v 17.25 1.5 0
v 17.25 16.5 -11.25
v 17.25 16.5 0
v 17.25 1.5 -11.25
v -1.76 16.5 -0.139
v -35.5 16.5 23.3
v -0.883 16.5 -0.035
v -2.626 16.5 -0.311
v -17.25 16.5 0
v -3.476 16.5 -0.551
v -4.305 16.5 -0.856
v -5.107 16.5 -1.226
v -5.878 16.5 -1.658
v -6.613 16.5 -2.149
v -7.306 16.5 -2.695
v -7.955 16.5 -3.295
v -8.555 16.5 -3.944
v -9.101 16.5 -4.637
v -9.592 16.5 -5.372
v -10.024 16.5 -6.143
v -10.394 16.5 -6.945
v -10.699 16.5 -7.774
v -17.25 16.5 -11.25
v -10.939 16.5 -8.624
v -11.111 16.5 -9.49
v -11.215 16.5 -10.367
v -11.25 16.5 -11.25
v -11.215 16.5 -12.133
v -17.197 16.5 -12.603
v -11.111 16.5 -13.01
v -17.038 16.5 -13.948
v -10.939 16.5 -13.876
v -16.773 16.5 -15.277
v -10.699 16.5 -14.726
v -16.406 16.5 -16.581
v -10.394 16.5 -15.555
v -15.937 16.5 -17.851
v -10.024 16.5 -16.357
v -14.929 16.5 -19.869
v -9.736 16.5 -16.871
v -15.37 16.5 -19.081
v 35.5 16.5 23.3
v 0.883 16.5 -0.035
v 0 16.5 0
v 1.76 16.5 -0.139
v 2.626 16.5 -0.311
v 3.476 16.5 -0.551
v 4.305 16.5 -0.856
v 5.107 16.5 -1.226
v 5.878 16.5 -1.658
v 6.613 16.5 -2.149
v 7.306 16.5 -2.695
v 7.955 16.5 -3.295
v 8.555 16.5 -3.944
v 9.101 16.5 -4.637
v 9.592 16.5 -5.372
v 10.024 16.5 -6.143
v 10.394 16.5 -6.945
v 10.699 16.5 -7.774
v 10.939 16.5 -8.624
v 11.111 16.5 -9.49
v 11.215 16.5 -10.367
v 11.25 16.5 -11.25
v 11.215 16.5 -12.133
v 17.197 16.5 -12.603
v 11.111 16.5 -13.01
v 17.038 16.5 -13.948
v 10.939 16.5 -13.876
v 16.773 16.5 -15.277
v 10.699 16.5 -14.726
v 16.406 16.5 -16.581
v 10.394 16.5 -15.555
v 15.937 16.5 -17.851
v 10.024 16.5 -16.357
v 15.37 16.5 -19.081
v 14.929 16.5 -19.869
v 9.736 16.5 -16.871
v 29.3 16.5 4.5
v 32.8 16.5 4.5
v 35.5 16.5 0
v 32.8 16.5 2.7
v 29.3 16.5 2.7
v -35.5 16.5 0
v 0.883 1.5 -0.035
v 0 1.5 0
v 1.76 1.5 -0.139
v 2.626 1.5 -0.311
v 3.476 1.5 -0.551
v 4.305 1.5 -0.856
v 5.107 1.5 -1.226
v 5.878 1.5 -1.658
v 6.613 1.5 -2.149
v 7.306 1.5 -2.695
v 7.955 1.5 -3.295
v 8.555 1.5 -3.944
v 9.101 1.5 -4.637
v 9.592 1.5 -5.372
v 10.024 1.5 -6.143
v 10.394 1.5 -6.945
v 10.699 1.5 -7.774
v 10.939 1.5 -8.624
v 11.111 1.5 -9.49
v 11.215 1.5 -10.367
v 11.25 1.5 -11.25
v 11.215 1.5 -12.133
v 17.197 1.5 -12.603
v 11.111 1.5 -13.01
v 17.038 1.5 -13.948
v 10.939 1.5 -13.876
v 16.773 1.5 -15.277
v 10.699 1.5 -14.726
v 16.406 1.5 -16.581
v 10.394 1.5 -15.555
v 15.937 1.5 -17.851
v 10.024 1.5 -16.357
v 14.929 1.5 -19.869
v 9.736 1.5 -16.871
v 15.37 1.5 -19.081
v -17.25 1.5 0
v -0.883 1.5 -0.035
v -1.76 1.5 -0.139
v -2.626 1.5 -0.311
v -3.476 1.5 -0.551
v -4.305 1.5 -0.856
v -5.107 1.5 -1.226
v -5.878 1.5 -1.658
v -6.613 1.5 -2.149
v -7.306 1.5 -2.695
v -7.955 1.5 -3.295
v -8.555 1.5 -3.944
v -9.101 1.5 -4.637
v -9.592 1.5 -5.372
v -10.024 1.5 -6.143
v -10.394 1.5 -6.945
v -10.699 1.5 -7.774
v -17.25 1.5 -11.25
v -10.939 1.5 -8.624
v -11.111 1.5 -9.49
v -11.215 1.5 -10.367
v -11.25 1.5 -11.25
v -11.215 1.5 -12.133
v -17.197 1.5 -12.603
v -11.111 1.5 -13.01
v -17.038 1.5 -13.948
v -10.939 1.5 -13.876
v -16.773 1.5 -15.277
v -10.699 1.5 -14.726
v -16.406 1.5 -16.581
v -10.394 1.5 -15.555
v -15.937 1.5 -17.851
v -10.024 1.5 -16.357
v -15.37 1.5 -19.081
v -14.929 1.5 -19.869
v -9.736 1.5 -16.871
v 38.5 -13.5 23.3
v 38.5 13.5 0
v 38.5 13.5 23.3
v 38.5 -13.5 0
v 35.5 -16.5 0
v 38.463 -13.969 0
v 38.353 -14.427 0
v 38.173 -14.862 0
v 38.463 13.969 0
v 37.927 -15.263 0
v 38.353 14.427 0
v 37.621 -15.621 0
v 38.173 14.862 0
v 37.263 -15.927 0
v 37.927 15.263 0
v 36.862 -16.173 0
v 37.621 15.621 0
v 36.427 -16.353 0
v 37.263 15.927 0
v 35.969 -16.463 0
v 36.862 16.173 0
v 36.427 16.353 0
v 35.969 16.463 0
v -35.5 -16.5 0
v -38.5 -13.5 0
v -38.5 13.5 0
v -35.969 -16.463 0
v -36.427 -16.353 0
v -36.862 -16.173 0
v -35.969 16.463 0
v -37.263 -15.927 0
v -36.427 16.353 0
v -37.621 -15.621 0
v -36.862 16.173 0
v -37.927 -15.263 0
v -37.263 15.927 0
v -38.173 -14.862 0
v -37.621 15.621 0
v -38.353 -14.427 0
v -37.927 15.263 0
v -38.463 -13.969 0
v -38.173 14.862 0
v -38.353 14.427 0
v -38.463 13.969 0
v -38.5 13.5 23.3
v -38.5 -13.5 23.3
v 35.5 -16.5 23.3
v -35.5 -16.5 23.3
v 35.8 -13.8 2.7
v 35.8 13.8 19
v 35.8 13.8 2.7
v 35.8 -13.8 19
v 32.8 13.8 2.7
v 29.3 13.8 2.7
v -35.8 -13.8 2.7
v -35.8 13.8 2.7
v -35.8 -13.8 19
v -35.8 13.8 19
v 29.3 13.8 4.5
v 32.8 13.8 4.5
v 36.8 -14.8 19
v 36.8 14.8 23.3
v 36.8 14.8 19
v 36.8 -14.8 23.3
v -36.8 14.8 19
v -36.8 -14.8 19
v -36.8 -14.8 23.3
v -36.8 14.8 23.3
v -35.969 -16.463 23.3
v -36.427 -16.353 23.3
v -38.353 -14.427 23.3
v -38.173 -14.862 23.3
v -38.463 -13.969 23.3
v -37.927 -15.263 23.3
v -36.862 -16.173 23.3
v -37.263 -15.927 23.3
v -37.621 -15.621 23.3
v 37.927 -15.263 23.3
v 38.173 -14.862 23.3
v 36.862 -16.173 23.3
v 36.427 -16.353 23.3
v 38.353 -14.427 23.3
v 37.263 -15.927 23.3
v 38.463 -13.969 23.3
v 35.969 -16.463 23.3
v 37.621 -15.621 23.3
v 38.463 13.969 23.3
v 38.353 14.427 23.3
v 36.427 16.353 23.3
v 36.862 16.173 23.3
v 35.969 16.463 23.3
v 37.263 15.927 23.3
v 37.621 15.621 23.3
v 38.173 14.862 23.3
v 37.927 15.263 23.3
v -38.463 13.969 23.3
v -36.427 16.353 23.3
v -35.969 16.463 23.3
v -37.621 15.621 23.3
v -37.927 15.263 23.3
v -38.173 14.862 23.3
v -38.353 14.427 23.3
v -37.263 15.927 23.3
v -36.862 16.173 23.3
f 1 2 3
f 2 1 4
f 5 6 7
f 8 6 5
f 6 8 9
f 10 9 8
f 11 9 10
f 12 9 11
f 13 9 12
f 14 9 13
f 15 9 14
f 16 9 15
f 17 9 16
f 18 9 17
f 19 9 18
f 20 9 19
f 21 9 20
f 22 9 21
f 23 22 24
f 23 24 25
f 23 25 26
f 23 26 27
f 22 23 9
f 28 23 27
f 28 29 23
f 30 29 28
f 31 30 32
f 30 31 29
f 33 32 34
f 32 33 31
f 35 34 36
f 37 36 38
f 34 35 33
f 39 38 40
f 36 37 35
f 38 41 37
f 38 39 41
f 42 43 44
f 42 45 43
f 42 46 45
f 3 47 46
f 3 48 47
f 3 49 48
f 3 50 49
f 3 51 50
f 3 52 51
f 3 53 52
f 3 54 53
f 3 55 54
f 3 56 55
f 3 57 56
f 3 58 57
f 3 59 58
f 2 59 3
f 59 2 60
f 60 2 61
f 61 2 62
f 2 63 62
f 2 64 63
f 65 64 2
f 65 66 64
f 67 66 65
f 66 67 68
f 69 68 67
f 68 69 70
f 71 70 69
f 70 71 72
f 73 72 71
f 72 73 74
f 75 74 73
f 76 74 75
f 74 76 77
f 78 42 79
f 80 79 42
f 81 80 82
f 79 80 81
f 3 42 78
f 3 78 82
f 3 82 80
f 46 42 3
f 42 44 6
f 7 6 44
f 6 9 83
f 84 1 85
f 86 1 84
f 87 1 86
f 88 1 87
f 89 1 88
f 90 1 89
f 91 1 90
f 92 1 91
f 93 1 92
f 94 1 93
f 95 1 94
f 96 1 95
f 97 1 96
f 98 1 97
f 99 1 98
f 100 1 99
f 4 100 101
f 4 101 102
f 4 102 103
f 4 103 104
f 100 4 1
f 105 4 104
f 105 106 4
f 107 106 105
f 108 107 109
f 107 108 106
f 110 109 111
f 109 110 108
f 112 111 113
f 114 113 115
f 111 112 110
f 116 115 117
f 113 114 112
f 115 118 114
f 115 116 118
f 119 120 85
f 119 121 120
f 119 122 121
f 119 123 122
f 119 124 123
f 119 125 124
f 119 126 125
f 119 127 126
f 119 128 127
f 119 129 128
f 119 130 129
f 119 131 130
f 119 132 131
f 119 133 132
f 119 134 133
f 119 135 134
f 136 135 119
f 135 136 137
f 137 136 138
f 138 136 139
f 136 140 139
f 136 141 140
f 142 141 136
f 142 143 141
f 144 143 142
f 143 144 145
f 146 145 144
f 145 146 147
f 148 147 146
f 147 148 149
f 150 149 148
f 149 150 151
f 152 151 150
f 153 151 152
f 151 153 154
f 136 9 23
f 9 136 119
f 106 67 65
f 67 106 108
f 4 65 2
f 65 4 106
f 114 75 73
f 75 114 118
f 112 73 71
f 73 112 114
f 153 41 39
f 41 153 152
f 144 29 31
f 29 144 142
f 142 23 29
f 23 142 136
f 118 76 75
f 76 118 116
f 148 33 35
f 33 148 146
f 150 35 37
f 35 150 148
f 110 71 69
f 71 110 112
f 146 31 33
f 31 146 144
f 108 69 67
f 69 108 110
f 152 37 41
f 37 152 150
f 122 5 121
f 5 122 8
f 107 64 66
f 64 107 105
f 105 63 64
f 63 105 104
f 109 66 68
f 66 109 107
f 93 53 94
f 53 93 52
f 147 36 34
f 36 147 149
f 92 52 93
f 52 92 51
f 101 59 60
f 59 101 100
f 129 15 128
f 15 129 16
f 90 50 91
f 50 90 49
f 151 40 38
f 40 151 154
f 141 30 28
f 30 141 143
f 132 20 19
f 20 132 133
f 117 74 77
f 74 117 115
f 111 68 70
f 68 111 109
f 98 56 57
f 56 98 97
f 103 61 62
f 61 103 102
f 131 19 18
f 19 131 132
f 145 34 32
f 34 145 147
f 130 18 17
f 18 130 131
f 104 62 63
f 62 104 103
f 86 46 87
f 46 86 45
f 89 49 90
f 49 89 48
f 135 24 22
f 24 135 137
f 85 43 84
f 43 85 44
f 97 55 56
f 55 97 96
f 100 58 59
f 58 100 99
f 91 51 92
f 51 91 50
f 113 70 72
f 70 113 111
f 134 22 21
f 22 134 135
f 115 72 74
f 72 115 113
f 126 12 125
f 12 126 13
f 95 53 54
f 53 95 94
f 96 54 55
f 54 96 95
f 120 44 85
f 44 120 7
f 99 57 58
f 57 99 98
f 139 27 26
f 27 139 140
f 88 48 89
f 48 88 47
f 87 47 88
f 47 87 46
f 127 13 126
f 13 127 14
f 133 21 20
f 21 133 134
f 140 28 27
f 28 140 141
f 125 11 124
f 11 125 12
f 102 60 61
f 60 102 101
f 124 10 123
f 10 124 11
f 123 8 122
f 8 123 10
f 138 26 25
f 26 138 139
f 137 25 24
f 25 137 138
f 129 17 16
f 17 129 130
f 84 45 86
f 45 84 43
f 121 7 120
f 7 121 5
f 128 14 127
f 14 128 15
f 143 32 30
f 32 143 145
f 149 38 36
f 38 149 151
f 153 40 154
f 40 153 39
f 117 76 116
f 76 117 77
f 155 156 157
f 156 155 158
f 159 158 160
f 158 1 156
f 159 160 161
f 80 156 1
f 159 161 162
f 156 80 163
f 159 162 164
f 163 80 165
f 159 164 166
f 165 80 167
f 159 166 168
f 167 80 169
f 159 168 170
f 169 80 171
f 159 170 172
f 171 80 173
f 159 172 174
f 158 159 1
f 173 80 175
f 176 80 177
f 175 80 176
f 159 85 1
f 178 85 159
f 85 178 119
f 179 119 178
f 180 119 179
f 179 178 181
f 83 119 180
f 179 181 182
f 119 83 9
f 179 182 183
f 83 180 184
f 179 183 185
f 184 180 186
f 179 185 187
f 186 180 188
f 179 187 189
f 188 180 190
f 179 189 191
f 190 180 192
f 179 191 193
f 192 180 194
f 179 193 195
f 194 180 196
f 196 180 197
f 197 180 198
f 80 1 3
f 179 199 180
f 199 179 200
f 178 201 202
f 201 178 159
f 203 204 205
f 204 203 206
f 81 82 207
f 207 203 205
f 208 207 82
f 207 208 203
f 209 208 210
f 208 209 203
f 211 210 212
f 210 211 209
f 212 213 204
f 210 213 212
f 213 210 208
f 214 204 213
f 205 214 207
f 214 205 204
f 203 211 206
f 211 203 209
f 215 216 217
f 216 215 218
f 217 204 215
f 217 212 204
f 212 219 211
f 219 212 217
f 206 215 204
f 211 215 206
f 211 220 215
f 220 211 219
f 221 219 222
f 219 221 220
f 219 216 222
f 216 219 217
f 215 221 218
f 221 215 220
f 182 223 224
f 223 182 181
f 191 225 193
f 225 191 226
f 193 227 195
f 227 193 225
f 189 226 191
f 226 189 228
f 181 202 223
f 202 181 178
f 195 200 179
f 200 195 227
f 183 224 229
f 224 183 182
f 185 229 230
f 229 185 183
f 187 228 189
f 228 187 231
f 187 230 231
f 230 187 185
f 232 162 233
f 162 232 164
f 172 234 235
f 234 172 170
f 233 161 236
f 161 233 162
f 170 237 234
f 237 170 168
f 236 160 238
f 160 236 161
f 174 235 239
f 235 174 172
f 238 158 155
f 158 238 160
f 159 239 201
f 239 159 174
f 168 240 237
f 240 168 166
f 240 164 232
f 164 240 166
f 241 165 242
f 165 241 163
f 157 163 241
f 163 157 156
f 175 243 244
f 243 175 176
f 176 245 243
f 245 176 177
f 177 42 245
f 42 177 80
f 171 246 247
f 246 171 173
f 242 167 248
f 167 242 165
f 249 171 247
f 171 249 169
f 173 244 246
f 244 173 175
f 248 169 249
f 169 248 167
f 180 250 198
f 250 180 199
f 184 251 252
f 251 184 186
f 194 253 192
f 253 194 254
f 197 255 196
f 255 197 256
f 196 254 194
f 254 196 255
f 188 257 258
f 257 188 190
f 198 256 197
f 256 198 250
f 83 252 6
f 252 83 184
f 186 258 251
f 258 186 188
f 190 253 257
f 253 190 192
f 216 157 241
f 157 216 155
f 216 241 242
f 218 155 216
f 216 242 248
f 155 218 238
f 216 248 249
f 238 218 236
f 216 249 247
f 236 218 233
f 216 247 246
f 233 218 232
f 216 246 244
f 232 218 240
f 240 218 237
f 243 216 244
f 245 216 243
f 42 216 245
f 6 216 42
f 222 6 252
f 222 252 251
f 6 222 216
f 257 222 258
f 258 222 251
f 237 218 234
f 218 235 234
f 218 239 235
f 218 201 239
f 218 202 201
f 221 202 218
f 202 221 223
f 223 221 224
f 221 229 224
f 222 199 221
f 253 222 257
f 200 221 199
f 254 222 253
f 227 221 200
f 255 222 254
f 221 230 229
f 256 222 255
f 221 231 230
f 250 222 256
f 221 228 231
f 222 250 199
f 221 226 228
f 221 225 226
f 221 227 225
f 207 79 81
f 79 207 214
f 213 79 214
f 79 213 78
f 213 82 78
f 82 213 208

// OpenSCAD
lx = 71;
ly = 27;
lz = 16;
h_acrylic = 3.3;
h_extra = 1;
indent = 1;
gap = 0.3;
thickness = 3;
hole_h = 3.5;
hole_w = 1.8;
fillet = 3;
eps = 1e-3;
// handlebar interface
d_handlebar = 22.5;
w_handlebar = 15;
t_handlebar = 6;
// opening angle
theta = 60;

module Fillet(r) {
    difference() {
        linear_extrude(10*lz, center=true) square(2*r, center=true);
        union() {
            translate([r, r, 0])
            linear_extrude(12*lz, center=true)
            circle(r, $fn=40);
            translate([r, -r, 0])
            linear_extrude(12*lz, center=true)
            circle(r, $fn=40);
            translate([-r, -r, 0])
            linear_extrude(12*lz, center=true)
            circle(r, $fn=40);
            translate([-r, r, 0])
            linear_extrude(12*lz, center=true)
            circle(r, $fn=40);
        }
    }
};

module Interior() {
    union() {
        translate([0, 0, lz+thickness-gap])
        cube([lx+2*gap, ly+2*gap, 2*lz], center=true);
        // place for acrylic
        translate([0, 0, lz + thickness + h_acrylic])
        cube([lx+2*gap+2*indent, ly+2*gap+2*indent, 2*h_acrylic], center=true);
    }
}

module WireHole() {
    translate([lx/2 - hole_h/2 + gap - thickness, ly/2, thickness + hole_w/2 - gap])
    cube([hole_h, 3*thickness, hole_w], center=true);
}

module Holder() {
    translate([0, ly/2 + thickness - w_handlebar/2, 0])
    rotate([-90, 0, 0])
    difference() {
        union() {
            cube([d_handlebar+2*t_handlebar, d_handlebar, w_handlebar], center=true);
            translate([0, d_handlebar/2, 0])
            cylinder(d=d_handlebar+2*t_handlebar, h=w_handlebar, center=true, $fn=80);
        }
        translate([0, d_handlebar/2, 0]) {
            cylinder(d=d_handlebar, h=3*lz, center=true, $fn=80);
            linear_extrude(3*lz, center=true)
            polygon([
                [0, 0],
                [-2*w_handlebar*tan(theta), 2*w_handlebar],
                [2*w_handlebar*tan(theta), 2*w_handlebar]
            ]);
        }
    }
}

module Box() {
    difference() {
        union() {
            translate([0, 0, lz/2 + thickness + h_acrylic/2 + h_extra/2])
            scale([lx+2*thickness, ly+2*thickness, lz+2*thickness + h_acrylic + h_extra])
            cube(1, center=true);
            Holder();
        }
        Interior();
        // remove the top
        translate([0, 0, lz+2*thickness + h_acrylic + h_extra])
        cube([2*lx, 2*ly, 2*thickness], center=true);
        translate([-lx/2-thickness, -ly/2-thickness, 0])
        Fillet(fillet);
        translate([lx/2+thickness, -ly/2-thickness, 0])
        Fillet(fillet);
        translate([lx/2+thickness, ly/2+thickness, 0])
        Fillet(fillet);
        translate([-lx/2-thickness, ly/2+thickness, 0])
        Fillet(fillet);
        WireHole();
    }
}

Box();
